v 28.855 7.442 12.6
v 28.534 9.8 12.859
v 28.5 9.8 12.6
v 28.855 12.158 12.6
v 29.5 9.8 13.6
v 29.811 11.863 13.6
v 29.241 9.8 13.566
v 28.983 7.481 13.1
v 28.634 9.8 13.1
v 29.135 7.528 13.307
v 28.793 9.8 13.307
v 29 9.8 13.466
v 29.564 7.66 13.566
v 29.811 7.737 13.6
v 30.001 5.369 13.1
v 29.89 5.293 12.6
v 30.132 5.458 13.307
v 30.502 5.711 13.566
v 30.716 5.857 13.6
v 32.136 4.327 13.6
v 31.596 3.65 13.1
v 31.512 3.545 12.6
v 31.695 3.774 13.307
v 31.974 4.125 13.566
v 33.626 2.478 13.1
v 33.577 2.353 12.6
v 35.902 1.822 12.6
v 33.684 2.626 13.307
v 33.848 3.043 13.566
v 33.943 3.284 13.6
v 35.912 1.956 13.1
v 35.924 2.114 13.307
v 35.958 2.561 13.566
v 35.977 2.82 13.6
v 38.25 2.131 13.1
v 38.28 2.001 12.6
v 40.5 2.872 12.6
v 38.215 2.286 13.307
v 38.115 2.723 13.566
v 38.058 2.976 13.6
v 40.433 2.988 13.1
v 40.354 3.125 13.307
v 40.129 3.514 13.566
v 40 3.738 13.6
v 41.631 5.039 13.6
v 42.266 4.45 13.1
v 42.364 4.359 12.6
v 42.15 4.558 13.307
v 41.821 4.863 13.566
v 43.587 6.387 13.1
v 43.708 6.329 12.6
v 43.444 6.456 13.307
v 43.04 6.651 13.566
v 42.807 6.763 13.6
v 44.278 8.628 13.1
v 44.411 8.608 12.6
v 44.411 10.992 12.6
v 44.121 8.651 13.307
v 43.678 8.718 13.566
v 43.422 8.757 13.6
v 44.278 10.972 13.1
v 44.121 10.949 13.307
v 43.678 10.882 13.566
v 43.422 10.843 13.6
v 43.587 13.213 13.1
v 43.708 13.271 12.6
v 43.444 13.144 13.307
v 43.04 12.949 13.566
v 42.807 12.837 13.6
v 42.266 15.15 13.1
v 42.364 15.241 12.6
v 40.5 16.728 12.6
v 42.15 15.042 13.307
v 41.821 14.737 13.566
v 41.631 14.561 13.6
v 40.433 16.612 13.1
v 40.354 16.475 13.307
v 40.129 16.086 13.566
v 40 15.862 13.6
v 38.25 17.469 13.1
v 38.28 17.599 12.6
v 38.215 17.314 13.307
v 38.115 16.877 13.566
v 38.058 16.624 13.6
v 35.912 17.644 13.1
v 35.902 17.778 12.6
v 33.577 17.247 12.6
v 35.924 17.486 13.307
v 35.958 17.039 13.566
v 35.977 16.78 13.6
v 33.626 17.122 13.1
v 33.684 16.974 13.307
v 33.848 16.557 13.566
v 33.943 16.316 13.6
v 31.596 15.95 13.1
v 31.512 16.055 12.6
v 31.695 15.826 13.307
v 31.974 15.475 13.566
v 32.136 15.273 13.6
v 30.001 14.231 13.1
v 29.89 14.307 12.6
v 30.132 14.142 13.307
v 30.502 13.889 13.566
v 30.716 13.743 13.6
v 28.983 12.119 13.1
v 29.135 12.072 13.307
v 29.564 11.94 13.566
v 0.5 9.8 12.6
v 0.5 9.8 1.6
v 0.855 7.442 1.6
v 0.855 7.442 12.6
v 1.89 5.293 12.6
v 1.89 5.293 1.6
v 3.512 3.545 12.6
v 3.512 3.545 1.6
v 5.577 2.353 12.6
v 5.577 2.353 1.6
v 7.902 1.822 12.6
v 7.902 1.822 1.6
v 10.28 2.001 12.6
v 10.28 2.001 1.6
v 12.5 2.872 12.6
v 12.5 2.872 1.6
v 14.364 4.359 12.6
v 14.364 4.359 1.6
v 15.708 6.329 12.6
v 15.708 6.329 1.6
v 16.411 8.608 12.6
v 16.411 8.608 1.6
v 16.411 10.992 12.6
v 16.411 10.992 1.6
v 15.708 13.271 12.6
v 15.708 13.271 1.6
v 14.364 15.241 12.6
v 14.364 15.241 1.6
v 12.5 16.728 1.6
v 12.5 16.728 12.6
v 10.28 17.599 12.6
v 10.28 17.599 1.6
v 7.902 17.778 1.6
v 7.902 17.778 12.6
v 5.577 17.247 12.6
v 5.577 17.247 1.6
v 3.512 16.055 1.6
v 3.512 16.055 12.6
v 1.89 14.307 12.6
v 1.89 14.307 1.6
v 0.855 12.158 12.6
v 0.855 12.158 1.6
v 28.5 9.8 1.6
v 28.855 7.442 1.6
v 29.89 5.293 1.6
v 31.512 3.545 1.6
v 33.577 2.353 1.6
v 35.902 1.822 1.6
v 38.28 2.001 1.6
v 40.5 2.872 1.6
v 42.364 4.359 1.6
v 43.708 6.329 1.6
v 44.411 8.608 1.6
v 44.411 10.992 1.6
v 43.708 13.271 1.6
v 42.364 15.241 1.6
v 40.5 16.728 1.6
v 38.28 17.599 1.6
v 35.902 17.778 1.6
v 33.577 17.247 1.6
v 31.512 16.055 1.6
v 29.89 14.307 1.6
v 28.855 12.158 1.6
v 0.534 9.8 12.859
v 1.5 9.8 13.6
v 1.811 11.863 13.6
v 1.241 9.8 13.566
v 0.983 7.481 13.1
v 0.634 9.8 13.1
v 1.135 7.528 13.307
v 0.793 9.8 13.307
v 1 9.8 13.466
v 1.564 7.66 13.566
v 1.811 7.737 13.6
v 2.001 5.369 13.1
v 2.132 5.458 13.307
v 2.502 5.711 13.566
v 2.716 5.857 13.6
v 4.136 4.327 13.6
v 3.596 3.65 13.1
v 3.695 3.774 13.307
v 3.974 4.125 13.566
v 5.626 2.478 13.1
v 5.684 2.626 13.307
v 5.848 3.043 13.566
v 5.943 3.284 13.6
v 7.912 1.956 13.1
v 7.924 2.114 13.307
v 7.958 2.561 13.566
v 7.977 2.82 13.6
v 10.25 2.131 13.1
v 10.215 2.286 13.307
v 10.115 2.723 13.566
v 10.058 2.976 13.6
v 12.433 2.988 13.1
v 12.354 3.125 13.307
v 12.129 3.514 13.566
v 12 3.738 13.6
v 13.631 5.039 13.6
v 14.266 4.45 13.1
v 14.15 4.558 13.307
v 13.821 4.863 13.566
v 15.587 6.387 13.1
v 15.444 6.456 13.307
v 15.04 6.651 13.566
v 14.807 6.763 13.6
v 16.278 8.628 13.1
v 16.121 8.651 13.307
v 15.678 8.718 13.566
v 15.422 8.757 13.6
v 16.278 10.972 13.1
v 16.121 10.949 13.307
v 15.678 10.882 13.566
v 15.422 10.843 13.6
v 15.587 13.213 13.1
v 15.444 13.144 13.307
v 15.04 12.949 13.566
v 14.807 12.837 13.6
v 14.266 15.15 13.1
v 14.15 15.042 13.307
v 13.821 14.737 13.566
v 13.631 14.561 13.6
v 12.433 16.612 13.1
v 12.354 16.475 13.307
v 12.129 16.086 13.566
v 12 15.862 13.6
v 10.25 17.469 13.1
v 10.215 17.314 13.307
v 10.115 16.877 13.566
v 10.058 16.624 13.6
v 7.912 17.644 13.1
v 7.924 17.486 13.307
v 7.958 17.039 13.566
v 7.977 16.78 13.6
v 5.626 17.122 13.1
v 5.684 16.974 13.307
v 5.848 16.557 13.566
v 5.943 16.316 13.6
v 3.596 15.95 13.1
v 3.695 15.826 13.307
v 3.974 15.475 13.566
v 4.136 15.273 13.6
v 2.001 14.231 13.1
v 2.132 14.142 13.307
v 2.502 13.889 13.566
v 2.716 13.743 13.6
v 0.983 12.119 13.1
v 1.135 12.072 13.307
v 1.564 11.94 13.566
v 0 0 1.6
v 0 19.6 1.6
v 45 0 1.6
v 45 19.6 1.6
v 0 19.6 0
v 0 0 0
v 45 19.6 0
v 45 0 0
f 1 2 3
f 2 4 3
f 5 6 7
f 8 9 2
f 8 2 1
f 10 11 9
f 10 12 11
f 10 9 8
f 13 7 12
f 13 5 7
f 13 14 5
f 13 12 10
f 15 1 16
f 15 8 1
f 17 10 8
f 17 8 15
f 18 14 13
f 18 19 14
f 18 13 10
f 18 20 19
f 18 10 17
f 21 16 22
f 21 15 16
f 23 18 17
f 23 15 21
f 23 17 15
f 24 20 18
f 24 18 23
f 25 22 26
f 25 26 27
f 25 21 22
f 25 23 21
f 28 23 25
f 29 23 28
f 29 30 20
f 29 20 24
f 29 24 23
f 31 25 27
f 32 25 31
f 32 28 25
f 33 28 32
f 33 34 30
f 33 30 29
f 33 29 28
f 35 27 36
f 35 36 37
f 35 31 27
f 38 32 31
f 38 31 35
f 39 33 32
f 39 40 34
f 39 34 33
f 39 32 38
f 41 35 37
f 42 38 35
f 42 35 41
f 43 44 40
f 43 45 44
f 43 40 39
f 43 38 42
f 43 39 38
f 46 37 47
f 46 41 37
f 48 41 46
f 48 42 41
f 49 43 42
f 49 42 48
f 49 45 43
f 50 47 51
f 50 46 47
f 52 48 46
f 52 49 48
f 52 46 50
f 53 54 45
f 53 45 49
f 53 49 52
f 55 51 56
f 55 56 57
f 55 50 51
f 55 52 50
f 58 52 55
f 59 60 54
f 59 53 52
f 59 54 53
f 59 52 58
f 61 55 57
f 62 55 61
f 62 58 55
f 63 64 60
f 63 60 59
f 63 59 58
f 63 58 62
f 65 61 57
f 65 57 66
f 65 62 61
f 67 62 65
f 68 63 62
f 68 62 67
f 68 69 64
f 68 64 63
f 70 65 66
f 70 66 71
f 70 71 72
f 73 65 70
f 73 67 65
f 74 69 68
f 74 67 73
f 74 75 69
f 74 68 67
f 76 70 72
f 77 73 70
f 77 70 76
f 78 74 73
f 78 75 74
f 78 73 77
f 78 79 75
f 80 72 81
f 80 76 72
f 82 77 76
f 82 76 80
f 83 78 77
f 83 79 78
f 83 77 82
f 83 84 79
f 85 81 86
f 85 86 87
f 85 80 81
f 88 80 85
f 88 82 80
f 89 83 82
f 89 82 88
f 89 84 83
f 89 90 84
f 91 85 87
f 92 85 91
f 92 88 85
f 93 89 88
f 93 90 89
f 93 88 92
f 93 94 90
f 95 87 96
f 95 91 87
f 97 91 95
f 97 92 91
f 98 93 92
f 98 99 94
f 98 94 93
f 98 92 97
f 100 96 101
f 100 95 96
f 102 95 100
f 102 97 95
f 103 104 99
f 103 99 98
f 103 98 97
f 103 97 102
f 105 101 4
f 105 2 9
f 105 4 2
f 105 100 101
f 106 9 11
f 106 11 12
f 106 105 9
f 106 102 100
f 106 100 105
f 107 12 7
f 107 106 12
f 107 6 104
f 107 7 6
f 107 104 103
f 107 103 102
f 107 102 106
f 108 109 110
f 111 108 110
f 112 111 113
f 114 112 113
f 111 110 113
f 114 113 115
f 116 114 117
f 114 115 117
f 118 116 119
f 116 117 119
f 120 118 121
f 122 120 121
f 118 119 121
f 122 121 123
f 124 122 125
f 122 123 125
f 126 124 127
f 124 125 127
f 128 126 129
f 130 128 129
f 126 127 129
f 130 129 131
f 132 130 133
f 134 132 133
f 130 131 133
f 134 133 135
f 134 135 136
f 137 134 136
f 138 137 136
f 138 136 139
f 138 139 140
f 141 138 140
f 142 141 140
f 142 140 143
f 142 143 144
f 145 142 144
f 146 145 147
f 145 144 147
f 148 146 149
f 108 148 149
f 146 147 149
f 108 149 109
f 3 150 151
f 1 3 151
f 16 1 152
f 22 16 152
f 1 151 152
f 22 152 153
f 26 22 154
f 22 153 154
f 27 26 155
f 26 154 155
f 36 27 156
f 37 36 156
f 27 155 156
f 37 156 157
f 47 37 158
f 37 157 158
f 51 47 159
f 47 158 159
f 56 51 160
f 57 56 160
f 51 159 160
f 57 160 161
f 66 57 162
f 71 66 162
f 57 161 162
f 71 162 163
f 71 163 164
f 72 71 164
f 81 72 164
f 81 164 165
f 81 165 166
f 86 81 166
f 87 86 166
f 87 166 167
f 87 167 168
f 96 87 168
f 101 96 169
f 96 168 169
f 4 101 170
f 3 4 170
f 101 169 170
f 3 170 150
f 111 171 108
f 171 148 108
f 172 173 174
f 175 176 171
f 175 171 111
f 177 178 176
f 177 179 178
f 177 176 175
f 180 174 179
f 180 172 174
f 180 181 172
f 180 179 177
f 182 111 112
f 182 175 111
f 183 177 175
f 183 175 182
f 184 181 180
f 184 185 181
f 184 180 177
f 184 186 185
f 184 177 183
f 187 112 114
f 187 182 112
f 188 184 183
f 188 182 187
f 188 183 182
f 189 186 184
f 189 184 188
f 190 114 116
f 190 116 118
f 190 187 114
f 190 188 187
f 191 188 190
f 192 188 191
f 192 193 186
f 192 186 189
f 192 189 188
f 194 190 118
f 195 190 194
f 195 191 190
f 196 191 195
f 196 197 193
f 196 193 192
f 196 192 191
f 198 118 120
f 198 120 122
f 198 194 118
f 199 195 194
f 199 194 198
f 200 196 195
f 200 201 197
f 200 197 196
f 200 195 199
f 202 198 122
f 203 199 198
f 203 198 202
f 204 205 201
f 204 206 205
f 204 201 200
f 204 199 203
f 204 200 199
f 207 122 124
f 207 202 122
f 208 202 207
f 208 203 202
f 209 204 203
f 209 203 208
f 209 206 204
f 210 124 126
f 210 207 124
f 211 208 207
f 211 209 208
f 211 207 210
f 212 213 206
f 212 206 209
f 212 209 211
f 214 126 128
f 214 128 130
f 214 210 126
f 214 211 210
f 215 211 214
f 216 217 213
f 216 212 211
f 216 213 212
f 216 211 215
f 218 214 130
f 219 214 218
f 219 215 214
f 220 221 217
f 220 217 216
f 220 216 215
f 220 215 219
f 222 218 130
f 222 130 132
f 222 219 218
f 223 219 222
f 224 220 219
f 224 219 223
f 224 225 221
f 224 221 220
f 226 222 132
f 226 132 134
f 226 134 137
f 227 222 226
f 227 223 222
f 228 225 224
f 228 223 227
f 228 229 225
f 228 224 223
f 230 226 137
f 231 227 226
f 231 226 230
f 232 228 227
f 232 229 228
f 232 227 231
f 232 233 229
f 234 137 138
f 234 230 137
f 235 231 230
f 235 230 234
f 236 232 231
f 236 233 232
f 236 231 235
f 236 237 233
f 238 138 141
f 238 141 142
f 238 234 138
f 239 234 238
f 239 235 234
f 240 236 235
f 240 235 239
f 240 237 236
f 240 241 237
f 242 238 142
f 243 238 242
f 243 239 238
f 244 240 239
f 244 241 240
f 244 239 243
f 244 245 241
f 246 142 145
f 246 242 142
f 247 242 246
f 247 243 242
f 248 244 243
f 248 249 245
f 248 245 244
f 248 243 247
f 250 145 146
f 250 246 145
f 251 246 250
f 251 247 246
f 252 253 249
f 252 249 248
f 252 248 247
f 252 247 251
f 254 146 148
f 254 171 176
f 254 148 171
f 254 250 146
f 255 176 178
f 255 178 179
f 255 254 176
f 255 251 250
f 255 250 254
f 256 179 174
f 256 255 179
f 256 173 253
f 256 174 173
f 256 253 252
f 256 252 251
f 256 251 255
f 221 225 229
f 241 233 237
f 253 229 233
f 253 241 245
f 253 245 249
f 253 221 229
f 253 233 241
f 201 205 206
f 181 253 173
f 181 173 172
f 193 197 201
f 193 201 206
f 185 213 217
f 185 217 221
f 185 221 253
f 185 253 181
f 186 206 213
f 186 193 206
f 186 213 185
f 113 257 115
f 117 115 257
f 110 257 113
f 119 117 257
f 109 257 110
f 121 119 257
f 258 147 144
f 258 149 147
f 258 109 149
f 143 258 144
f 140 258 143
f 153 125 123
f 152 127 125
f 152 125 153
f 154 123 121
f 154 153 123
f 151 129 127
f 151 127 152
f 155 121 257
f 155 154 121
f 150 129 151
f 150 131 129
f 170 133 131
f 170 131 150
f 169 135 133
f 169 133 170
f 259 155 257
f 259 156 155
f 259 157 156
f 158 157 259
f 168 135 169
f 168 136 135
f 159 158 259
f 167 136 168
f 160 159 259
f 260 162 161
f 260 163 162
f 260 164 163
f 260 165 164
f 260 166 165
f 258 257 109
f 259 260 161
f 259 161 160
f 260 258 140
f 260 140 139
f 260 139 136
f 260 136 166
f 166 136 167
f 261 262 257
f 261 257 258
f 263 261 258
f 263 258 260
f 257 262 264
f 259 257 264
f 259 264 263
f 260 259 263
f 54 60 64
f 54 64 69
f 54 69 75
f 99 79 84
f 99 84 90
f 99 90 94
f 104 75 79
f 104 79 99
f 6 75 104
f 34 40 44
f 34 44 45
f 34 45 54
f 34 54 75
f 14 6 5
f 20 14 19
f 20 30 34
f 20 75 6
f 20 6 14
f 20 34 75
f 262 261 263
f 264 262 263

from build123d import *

# Parameters (mm, degrees)
SKETCH_1_W      = 45
SKETCH_1_H      = 19.6
EXTRUDE_1_DEPTH = 1.6
SKETCH_2_R      = 8
EXTRUDE_2_DEPTH = 12
FILLET_1_R      = 1


with BuildPart() as part:
    # 草图1 → 凸台-拉伸1 (new body)
    with BuildSketch(Plane.XY):
        with Locations((22.5, 9.8)):
            Rectangle(SKETCH_1_W, SKETCH_1_H)
    extrude(amount=EXTRUDE_1_DEPTH)

    # 草图2 → 凸台-拉伸2 (add)
    with BuildSketch(Plane.XY.offset(1.6)):
        with Locations(Location((8.5, 9.8, 0), (0, 0, 180))):
            Circle(SKETCH_2_R)
        with Locations(Location((36.5, 9.8, 0), (0, 0, 180))):
            Circle(SKETCH_2_R)
    extrude(amount=EXTRUDE_2_DEPTH)

    # 圆角1
    fillet_1_edges = [part.edges().sort_by_distance(p)[0] for p in [
        (16.5, 9.8, 13.6),
        (44.5, 9.8, 13.6),
    ]]
    fillet(fillet_1_edges, radius=FILLET_1_R)


solid = part.part
